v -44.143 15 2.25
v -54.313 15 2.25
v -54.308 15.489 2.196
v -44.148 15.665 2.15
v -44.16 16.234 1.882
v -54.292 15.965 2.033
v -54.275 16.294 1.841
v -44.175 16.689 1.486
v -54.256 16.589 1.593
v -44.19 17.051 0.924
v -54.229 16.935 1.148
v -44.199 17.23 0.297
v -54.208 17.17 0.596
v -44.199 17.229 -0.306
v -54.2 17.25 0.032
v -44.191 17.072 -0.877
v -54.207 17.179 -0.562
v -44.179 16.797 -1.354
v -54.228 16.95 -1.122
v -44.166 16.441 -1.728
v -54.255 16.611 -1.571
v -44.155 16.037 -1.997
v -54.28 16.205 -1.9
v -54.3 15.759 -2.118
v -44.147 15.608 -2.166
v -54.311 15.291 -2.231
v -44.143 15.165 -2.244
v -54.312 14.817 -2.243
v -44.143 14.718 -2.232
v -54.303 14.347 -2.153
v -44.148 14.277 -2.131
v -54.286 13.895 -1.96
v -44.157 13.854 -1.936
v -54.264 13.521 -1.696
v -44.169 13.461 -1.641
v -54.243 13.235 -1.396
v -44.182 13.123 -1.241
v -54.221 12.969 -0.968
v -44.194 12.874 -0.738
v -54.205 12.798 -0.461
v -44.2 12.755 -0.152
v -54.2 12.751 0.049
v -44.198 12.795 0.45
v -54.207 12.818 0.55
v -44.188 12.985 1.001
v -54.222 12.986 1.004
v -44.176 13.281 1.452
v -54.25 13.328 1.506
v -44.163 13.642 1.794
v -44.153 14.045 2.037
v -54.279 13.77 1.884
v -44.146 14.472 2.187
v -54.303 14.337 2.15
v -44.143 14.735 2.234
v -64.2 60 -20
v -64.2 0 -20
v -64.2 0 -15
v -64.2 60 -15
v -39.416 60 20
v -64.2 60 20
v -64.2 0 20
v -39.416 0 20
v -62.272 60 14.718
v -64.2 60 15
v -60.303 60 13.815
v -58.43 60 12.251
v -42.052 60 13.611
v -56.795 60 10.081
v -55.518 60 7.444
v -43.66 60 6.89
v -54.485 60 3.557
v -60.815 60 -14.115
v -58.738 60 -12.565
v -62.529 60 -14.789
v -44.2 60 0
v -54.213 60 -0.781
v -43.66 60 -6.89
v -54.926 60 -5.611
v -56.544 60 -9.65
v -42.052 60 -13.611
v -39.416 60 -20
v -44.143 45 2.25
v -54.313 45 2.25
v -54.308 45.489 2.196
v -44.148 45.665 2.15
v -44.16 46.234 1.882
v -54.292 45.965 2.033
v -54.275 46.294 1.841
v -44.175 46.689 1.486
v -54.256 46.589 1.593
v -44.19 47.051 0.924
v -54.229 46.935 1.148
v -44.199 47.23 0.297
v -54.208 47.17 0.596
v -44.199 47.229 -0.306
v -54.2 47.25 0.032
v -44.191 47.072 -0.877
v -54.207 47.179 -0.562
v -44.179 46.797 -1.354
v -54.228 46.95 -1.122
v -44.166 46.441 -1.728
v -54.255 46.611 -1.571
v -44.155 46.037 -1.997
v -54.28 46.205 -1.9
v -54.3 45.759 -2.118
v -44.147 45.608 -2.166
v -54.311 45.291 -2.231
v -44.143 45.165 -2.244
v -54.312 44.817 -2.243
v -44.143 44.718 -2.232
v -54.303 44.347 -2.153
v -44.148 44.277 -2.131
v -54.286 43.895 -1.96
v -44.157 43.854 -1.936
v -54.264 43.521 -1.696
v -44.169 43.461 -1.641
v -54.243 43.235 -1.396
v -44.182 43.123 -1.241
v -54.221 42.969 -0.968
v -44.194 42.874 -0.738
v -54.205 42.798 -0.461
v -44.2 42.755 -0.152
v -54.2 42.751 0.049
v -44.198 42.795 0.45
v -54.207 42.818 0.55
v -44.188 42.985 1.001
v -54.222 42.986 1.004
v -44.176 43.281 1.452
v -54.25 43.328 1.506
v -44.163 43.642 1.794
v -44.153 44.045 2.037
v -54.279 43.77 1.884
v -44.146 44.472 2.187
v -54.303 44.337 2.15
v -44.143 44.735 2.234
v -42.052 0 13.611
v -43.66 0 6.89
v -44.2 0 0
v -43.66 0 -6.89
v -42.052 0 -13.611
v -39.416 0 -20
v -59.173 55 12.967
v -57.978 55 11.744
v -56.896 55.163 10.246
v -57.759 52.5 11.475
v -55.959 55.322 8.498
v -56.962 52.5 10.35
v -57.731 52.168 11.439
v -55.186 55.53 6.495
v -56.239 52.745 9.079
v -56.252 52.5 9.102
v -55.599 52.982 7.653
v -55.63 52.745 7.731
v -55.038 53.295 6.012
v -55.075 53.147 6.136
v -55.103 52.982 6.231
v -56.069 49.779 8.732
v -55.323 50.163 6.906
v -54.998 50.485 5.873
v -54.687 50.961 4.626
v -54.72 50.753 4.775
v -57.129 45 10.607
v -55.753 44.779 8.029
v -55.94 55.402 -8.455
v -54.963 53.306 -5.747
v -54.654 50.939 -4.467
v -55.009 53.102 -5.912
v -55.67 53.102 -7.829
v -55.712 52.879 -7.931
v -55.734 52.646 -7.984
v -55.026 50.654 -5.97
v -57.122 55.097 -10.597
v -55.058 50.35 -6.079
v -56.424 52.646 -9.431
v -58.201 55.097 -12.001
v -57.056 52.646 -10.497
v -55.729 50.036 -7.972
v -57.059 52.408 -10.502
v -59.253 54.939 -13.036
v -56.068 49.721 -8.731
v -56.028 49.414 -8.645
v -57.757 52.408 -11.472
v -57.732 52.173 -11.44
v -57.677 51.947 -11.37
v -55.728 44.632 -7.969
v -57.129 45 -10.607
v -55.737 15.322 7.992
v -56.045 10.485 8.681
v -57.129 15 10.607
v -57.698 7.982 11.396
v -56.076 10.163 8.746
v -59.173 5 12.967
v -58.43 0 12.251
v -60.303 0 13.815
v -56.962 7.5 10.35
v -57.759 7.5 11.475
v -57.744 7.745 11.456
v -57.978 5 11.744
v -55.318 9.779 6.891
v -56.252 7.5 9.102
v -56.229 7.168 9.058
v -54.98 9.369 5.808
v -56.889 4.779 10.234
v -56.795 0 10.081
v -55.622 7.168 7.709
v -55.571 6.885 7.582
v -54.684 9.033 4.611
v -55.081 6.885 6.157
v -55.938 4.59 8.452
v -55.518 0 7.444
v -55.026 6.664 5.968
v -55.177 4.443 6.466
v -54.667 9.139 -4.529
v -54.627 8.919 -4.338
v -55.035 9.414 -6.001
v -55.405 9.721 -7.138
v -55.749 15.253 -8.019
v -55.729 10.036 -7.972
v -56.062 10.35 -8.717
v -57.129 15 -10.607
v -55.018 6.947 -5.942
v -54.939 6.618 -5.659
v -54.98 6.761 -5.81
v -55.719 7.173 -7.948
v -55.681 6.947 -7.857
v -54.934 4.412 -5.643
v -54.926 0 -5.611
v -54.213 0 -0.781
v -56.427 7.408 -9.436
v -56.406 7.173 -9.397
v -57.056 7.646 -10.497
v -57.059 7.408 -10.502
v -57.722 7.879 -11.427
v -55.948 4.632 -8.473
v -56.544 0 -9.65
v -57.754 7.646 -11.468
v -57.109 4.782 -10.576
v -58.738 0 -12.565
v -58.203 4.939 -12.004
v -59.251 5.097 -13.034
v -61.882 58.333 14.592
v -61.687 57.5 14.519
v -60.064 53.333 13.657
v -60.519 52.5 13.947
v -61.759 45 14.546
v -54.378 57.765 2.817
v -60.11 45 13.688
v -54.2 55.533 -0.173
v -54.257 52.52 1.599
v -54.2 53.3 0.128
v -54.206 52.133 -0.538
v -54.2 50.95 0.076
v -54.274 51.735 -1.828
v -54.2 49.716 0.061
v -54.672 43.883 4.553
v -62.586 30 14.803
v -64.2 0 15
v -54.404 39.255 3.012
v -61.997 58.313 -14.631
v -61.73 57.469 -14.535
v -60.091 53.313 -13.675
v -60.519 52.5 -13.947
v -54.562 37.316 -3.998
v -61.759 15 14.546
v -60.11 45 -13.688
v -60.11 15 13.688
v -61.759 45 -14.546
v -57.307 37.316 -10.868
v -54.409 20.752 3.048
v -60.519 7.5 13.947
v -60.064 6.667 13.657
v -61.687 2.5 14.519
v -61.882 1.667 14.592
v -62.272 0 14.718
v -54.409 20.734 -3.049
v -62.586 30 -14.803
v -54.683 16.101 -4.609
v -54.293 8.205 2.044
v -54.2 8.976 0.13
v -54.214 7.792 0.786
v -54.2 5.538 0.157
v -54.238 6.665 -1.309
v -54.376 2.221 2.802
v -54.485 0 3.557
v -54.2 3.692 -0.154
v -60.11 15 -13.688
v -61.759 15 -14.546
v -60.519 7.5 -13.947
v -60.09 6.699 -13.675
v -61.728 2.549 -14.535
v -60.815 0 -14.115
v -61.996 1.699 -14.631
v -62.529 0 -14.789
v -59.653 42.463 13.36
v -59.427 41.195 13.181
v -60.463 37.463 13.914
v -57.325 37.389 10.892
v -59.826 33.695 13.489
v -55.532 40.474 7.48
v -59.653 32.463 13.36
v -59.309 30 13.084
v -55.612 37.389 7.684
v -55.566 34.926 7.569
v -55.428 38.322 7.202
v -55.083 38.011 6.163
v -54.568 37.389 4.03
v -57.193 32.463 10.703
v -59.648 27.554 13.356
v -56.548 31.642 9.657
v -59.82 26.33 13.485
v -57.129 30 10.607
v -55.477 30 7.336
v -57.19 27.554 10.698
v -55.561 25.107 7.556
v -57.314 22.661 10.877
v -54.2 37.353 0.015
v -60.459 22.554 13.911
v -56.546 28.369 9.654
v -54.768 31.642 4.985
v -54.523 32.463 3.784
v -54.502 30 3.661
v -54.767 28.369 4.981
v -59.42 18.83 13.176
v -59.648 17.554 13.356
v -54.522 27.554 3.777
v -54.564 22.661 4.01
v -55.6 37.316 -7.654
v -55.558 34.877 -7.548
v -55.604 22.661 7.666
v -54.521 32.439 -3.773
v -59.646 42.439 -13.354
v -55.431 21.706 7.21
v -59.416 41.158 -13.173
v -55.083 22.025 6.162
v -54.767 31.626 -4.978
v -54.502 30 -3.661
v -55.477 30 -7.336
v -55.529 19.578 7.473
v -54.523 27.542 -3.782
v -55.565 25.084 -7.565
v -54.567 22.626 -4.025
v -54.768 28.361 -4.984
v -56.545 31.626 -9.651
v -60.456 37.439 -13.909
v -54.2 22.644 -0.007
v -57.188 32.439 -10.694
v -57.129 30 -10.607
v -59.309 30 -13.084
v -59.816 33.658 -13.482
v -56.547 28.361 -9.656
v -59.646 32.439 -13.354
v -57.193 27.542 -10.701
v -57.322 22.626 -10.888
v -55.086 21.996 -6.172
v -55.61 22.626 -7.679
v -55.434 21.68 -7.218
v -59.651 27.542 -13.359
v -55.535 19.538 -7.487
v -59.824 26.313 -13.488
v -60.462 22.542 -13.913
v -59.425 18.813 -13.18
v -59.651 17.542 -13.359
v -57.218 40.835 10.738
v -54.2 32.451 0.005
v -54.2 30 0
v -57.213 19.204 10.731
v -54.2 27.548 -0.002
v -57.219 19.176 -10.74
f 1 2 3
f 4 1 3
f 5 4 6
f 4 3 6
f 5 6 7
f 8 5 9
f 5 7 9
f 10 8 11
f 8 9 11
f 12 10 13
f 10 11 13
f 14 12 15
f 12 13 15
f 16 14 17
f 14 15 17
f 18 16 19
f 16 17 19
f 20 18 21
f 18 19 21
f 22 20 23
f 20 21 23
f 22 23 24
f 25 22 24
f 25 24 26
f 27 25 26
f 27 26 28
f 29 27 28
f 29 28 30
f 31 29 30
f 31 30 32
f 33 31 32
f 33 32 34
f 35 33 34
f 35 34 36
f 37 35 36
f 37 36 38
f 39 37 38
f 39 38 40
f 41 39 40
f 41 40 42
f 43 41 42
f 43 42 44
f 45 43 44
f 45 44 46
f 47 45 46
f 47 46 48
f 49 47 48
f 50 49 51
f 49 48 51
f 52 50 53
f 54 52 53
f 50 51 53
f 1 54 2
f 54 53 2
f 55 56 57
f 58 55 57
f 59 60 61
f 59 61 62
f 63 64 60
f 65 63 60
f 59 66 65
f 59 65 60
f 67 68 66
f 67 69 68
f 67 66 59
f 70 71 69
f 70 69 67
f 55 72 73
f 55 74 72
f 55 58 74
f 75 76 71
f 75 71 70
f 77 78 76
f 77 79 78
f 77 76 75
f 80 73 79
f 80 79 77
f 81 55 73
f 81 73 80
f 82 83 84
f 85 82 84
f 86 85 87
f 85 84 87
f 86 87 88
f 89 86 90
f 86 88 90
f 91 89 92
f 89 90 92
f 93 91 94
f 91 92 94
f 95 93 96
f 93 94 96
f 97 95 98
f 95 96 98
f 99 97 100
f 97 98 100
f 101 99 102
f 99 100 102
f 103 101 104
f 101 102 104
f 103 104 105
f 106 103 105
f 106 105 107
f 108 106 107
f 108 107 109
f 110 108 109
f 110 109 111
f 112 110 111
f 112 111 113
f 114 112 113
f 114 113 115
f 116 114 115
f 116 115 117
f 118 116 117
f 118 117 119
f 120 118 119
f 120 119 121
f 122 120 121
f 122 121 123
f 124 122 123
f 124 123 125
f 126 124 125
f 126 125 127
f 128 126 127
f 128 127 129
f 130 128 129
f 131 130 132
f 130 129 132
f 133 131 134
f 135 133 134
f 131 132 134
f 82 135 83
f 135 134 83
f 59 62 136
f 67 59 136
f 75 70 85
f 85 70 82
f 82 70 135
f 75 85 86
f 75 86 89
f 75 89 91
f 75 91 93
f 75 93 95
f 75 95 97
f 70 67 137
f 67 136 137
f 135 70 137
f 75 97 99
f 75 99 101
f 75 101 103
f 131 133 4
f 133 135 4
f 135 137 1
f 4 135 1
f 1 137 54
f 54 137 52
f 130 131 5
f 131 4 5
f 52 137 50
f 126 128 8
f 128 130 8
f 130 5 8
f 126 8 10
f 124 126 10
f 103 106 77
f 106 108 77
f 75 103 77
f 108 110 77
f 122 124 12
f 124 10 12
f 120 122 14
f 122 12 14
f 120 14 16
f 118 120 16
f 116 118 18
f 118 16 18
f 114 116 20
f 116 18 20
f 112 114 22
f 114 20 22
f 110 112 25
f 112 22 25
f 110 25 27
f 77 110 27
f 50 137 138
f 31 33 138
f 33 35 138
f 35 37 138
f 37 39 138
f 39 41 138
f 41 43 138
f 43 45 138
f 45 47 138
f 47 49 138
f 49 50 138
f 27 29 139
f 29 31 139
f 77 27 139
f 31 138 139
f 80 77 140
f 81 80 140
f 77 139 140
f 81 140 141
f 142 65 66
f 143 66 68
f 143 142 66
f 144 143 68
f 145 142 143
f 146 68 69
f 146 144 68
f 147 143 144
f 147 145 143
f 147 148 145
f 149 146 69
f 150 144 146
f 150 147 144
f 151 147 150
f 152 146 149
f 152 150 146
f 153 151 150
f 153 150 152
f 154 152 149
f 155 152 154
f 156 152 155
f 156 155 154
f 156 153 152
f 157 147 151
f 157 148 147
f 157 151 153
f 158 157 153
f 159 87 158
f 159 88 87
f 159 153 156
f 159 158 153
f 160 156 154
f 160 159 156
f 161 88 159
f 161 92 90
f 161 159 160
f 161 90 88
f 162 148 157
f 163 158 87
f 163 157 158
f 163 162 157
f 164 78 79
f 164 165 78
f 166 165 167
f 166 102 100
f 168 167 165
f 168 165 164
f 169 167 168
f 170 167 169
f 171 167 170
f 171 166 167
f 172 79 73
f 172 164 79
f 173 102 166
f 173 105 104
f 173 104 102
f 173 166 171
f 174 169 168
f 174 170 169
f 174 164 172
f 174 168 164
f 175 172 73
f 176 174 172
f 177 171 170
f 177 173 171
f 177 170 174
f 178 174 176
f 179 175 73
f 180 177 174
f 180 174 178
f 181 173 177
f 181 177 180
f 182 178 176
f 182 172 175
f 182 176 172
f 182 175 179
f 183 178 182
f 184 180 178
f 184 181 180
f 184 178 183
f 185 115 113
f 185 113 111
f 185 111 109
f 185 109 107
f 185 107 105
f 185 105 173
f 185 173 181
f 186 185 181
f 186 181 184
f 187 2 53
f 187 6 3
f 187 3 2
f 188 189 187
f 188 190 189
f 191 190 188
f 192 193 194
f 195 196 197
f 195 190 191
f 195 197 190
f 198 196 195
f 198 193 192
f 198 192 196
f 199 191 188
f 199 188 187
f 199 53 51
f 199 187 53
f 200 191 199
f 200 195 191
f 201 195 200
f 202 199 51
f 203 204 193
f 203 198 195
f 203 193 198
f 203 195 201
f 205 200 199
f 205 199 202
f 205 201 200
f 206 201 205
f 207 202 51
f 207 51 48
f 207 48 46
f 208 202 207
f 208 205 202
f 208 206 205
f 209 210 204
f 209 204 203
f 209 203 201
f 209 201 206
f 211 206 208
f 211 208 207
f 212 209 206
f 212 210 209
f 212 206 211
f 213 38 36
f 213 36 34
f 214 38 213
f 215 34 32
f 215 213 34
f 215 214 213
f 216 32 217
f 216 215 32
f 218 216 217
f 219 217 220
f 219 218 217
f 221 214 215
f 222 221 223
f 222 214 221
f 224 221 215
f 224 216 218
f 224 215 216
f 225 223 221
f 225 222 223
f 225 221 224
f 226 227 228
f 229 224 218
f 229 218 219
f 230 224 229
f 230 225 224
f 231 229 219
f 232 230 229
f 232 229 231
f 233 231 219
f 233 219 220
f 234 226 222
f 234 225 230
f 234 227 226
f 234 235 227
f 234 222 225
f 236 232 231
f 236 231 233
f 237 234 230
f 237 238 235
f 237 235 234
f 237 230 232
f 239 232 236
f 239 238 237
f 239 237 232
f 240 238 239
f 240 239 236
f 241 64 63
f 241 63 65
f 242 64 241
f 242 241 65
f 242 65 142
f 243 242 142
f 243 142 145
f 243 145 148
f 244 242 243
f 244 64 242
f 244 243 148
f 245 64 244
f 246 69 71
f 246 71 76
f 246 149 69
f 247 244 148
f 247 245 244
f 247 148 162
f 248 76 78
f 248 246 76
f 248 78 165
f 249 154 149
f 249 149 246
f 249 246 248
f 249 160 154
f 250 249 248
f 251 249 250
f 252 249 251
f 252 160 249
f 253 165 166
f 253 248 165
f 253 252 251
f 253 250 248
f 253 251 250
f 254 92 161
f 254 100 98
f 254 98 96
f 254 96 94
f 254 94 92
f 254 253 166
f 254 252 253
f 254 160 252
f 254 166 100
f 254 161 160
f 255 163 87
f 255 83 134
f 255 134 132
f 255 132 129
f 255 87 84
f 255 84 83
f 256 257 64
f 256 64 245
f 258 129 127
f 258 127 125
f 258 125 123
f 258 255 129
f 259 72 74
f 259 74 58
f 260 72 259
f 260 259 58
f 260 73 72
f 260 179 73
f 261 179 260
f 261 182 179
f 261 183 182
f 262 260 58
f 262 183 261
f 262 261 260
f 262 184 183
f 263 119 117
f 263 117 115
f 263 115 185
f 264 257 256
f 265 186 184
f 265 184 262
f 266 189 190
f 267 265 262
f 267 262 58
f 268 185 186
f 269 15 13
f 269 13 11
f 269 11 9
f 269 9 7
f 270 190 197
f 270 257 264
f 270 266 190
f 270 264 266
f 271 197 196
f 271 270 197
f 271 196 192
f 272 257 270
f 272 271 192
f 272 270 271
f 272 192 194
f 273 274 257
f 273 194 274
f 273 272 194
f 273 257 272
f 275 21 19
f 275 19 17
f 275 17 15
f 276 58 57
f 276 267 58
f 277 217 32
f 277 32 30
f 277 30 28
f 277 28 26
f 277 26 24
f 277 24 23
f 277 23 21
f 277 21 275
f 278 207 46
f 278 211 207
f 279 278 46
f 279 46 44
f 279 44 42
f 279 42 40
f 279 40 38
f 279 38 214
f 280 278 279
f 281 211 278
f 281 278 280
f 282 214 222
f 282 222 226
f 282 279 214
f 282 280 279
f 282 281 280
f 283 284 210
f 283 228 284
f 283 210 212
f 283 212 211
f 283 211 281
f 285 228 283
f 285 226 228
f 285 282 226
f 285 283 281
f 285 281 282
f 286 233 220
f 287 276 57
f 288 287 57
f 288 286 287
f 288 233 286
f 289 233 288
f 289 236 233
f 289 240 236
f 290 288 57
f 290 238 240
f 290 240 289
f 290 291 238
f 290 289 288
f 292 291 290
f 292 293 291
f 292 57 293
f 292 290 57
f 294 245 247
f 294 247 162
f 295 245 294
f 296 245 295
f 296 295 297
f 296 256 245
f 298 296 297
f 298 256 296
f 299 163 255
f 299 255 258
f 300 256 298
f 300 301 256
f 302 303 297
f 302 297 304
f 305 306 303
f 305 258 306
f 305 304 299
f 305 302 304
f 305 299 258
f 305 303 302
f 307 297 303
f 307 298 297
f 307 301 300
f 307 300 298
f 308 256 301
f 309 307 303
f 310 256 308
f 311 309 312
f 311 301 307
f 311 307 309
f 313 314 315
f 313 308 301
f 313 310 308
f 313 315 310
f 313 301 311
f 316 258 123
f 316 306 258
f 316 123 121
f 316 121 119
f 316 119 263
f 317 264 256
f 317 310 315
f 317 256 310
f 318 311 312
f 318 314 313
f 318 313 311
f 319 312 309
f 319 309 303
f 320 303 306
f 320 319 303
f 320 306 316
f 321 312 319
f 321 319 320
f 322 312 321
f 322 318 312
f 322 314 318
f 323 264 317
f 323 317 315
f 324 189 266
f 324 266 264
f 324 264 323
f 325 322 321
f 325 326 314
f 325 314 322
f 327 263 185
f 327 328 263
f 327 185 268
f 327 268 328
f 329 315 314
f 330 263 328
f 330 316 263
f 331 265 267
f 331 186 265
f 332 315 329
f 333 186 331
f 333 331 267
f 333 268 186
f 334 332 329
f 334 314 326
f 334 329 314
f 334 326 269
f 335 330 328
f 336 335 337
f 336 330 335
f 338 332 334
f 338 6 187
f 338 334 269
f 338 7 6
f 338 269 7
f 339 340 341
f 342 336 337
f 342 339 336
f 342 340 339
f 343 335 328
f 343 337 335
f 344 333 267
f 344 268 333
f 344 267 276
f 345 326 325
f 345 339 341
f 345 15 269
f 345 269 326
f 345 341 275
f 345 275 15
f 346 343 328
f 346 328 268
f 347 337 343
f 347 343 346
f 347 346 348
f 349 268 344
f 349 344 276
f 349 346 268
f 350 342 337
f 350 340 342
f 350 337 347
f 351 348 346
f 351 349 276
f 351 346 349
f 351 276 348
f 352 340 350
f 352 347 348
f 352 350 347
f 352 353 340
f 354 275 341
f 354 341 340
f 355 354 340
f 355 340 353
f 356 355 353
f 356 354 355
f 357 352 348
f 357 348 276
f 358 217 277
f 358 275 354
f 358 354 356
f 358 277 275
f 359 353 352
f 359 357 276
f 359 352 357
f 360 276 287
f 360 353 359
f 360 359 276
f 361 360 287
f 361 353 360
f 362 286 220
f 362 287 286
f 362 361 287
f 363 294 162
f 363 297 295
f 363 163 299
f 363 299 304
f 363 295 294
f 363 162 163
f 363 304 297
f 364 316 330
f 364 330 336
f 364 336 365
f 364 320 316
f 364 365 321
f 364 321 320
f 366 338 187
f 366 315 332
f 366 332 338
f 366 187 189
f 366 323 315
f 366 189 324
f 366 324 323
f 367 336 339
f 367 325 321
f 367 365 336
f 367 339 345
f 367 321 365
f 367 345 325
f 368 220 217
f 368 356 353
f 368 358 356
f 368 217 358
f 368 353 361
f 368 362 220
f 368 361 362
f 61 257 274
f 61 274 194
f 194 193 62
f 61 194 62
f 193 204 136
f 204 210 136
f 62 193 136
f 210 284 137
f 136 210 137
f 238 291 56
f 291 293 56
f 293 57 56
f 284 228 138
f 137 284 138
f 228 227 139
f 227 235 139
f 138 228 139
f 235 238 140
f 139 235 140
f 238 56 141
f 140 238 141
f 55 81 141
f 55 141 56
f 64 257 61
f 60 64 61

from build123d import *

# Parameters (mm, degrees)
BOSS_EXTRUDE1_DEPTH      = 60
M4_CLEARANCE_HOLE1_D     = 4.5
M4_CLEARANCE_HOLE1_DEPTH = 70
M4_CLEARANCE_HOLE1_TIP   = 1.351936393


with BuildPart() as part:
    # Sketch1 → Boss-Extrude1 (new body)
    with BuildSketch(Plane(origin=(0, 0, 0), x_dir=(1, 0, 0), z_dir=(0, 1, 0))):
        with BuildLine():
            Line((-64.199832154, 20), (-64.199832154, 15))
            add(Edge.make_bspline(
                [(-64.199832154, -15), (-54.199832154, -15), (-54.199832154, 0), (-54.199832154, 15), (-64.199832154, 15)],
                knots=[3.141592654, 3.141592654, 3.141592654, 4.71238898, 4.71238898, 6.283185307, 6.283185307, 6.283185307], degree=2, weights=[1, 0.707106781, 1, 0.707106781, 1]))
            Line((-64.199832154, -15), (-64.199832154, -20))
            Line((-64.199832154, -20), (-39.416052091, -20))
            ThreePointArc((-39.416052091, -20), (-44.199832154, 0), (-39.416052091, 20))
            Line((-39.416052091, 20), (-64.199832154, 20))
        make_face()
    extrude(amount=BOSS_EXTRUDE1_DEPTH)

    # M4 Clearance Hole1
    with Locations(Plane(origin=(0, 0, 0), x_dir=(0, 0, -1), z_dir=(1, 0, 0))):
        with Locations((0, 45), (0, 15)):
            Hole(M4_CLEARANCE_HOLE1_D / 2, depth=M4_CLEARANCE_HOLE1_DEPTH)
            with Locations((0, 0, -(M4_CLEARANCE_HOLE1_DEPTH + M4_CLEARANCE_HOLE1_TIP / 2))):  # 118° drill point
                Cone(0, M4_CLEARANCE_HOLE1_D / 2, M4_CLEARANCE_HOLE1_TIP, mode=Mode.SUBTRACT)


solid = part.part
